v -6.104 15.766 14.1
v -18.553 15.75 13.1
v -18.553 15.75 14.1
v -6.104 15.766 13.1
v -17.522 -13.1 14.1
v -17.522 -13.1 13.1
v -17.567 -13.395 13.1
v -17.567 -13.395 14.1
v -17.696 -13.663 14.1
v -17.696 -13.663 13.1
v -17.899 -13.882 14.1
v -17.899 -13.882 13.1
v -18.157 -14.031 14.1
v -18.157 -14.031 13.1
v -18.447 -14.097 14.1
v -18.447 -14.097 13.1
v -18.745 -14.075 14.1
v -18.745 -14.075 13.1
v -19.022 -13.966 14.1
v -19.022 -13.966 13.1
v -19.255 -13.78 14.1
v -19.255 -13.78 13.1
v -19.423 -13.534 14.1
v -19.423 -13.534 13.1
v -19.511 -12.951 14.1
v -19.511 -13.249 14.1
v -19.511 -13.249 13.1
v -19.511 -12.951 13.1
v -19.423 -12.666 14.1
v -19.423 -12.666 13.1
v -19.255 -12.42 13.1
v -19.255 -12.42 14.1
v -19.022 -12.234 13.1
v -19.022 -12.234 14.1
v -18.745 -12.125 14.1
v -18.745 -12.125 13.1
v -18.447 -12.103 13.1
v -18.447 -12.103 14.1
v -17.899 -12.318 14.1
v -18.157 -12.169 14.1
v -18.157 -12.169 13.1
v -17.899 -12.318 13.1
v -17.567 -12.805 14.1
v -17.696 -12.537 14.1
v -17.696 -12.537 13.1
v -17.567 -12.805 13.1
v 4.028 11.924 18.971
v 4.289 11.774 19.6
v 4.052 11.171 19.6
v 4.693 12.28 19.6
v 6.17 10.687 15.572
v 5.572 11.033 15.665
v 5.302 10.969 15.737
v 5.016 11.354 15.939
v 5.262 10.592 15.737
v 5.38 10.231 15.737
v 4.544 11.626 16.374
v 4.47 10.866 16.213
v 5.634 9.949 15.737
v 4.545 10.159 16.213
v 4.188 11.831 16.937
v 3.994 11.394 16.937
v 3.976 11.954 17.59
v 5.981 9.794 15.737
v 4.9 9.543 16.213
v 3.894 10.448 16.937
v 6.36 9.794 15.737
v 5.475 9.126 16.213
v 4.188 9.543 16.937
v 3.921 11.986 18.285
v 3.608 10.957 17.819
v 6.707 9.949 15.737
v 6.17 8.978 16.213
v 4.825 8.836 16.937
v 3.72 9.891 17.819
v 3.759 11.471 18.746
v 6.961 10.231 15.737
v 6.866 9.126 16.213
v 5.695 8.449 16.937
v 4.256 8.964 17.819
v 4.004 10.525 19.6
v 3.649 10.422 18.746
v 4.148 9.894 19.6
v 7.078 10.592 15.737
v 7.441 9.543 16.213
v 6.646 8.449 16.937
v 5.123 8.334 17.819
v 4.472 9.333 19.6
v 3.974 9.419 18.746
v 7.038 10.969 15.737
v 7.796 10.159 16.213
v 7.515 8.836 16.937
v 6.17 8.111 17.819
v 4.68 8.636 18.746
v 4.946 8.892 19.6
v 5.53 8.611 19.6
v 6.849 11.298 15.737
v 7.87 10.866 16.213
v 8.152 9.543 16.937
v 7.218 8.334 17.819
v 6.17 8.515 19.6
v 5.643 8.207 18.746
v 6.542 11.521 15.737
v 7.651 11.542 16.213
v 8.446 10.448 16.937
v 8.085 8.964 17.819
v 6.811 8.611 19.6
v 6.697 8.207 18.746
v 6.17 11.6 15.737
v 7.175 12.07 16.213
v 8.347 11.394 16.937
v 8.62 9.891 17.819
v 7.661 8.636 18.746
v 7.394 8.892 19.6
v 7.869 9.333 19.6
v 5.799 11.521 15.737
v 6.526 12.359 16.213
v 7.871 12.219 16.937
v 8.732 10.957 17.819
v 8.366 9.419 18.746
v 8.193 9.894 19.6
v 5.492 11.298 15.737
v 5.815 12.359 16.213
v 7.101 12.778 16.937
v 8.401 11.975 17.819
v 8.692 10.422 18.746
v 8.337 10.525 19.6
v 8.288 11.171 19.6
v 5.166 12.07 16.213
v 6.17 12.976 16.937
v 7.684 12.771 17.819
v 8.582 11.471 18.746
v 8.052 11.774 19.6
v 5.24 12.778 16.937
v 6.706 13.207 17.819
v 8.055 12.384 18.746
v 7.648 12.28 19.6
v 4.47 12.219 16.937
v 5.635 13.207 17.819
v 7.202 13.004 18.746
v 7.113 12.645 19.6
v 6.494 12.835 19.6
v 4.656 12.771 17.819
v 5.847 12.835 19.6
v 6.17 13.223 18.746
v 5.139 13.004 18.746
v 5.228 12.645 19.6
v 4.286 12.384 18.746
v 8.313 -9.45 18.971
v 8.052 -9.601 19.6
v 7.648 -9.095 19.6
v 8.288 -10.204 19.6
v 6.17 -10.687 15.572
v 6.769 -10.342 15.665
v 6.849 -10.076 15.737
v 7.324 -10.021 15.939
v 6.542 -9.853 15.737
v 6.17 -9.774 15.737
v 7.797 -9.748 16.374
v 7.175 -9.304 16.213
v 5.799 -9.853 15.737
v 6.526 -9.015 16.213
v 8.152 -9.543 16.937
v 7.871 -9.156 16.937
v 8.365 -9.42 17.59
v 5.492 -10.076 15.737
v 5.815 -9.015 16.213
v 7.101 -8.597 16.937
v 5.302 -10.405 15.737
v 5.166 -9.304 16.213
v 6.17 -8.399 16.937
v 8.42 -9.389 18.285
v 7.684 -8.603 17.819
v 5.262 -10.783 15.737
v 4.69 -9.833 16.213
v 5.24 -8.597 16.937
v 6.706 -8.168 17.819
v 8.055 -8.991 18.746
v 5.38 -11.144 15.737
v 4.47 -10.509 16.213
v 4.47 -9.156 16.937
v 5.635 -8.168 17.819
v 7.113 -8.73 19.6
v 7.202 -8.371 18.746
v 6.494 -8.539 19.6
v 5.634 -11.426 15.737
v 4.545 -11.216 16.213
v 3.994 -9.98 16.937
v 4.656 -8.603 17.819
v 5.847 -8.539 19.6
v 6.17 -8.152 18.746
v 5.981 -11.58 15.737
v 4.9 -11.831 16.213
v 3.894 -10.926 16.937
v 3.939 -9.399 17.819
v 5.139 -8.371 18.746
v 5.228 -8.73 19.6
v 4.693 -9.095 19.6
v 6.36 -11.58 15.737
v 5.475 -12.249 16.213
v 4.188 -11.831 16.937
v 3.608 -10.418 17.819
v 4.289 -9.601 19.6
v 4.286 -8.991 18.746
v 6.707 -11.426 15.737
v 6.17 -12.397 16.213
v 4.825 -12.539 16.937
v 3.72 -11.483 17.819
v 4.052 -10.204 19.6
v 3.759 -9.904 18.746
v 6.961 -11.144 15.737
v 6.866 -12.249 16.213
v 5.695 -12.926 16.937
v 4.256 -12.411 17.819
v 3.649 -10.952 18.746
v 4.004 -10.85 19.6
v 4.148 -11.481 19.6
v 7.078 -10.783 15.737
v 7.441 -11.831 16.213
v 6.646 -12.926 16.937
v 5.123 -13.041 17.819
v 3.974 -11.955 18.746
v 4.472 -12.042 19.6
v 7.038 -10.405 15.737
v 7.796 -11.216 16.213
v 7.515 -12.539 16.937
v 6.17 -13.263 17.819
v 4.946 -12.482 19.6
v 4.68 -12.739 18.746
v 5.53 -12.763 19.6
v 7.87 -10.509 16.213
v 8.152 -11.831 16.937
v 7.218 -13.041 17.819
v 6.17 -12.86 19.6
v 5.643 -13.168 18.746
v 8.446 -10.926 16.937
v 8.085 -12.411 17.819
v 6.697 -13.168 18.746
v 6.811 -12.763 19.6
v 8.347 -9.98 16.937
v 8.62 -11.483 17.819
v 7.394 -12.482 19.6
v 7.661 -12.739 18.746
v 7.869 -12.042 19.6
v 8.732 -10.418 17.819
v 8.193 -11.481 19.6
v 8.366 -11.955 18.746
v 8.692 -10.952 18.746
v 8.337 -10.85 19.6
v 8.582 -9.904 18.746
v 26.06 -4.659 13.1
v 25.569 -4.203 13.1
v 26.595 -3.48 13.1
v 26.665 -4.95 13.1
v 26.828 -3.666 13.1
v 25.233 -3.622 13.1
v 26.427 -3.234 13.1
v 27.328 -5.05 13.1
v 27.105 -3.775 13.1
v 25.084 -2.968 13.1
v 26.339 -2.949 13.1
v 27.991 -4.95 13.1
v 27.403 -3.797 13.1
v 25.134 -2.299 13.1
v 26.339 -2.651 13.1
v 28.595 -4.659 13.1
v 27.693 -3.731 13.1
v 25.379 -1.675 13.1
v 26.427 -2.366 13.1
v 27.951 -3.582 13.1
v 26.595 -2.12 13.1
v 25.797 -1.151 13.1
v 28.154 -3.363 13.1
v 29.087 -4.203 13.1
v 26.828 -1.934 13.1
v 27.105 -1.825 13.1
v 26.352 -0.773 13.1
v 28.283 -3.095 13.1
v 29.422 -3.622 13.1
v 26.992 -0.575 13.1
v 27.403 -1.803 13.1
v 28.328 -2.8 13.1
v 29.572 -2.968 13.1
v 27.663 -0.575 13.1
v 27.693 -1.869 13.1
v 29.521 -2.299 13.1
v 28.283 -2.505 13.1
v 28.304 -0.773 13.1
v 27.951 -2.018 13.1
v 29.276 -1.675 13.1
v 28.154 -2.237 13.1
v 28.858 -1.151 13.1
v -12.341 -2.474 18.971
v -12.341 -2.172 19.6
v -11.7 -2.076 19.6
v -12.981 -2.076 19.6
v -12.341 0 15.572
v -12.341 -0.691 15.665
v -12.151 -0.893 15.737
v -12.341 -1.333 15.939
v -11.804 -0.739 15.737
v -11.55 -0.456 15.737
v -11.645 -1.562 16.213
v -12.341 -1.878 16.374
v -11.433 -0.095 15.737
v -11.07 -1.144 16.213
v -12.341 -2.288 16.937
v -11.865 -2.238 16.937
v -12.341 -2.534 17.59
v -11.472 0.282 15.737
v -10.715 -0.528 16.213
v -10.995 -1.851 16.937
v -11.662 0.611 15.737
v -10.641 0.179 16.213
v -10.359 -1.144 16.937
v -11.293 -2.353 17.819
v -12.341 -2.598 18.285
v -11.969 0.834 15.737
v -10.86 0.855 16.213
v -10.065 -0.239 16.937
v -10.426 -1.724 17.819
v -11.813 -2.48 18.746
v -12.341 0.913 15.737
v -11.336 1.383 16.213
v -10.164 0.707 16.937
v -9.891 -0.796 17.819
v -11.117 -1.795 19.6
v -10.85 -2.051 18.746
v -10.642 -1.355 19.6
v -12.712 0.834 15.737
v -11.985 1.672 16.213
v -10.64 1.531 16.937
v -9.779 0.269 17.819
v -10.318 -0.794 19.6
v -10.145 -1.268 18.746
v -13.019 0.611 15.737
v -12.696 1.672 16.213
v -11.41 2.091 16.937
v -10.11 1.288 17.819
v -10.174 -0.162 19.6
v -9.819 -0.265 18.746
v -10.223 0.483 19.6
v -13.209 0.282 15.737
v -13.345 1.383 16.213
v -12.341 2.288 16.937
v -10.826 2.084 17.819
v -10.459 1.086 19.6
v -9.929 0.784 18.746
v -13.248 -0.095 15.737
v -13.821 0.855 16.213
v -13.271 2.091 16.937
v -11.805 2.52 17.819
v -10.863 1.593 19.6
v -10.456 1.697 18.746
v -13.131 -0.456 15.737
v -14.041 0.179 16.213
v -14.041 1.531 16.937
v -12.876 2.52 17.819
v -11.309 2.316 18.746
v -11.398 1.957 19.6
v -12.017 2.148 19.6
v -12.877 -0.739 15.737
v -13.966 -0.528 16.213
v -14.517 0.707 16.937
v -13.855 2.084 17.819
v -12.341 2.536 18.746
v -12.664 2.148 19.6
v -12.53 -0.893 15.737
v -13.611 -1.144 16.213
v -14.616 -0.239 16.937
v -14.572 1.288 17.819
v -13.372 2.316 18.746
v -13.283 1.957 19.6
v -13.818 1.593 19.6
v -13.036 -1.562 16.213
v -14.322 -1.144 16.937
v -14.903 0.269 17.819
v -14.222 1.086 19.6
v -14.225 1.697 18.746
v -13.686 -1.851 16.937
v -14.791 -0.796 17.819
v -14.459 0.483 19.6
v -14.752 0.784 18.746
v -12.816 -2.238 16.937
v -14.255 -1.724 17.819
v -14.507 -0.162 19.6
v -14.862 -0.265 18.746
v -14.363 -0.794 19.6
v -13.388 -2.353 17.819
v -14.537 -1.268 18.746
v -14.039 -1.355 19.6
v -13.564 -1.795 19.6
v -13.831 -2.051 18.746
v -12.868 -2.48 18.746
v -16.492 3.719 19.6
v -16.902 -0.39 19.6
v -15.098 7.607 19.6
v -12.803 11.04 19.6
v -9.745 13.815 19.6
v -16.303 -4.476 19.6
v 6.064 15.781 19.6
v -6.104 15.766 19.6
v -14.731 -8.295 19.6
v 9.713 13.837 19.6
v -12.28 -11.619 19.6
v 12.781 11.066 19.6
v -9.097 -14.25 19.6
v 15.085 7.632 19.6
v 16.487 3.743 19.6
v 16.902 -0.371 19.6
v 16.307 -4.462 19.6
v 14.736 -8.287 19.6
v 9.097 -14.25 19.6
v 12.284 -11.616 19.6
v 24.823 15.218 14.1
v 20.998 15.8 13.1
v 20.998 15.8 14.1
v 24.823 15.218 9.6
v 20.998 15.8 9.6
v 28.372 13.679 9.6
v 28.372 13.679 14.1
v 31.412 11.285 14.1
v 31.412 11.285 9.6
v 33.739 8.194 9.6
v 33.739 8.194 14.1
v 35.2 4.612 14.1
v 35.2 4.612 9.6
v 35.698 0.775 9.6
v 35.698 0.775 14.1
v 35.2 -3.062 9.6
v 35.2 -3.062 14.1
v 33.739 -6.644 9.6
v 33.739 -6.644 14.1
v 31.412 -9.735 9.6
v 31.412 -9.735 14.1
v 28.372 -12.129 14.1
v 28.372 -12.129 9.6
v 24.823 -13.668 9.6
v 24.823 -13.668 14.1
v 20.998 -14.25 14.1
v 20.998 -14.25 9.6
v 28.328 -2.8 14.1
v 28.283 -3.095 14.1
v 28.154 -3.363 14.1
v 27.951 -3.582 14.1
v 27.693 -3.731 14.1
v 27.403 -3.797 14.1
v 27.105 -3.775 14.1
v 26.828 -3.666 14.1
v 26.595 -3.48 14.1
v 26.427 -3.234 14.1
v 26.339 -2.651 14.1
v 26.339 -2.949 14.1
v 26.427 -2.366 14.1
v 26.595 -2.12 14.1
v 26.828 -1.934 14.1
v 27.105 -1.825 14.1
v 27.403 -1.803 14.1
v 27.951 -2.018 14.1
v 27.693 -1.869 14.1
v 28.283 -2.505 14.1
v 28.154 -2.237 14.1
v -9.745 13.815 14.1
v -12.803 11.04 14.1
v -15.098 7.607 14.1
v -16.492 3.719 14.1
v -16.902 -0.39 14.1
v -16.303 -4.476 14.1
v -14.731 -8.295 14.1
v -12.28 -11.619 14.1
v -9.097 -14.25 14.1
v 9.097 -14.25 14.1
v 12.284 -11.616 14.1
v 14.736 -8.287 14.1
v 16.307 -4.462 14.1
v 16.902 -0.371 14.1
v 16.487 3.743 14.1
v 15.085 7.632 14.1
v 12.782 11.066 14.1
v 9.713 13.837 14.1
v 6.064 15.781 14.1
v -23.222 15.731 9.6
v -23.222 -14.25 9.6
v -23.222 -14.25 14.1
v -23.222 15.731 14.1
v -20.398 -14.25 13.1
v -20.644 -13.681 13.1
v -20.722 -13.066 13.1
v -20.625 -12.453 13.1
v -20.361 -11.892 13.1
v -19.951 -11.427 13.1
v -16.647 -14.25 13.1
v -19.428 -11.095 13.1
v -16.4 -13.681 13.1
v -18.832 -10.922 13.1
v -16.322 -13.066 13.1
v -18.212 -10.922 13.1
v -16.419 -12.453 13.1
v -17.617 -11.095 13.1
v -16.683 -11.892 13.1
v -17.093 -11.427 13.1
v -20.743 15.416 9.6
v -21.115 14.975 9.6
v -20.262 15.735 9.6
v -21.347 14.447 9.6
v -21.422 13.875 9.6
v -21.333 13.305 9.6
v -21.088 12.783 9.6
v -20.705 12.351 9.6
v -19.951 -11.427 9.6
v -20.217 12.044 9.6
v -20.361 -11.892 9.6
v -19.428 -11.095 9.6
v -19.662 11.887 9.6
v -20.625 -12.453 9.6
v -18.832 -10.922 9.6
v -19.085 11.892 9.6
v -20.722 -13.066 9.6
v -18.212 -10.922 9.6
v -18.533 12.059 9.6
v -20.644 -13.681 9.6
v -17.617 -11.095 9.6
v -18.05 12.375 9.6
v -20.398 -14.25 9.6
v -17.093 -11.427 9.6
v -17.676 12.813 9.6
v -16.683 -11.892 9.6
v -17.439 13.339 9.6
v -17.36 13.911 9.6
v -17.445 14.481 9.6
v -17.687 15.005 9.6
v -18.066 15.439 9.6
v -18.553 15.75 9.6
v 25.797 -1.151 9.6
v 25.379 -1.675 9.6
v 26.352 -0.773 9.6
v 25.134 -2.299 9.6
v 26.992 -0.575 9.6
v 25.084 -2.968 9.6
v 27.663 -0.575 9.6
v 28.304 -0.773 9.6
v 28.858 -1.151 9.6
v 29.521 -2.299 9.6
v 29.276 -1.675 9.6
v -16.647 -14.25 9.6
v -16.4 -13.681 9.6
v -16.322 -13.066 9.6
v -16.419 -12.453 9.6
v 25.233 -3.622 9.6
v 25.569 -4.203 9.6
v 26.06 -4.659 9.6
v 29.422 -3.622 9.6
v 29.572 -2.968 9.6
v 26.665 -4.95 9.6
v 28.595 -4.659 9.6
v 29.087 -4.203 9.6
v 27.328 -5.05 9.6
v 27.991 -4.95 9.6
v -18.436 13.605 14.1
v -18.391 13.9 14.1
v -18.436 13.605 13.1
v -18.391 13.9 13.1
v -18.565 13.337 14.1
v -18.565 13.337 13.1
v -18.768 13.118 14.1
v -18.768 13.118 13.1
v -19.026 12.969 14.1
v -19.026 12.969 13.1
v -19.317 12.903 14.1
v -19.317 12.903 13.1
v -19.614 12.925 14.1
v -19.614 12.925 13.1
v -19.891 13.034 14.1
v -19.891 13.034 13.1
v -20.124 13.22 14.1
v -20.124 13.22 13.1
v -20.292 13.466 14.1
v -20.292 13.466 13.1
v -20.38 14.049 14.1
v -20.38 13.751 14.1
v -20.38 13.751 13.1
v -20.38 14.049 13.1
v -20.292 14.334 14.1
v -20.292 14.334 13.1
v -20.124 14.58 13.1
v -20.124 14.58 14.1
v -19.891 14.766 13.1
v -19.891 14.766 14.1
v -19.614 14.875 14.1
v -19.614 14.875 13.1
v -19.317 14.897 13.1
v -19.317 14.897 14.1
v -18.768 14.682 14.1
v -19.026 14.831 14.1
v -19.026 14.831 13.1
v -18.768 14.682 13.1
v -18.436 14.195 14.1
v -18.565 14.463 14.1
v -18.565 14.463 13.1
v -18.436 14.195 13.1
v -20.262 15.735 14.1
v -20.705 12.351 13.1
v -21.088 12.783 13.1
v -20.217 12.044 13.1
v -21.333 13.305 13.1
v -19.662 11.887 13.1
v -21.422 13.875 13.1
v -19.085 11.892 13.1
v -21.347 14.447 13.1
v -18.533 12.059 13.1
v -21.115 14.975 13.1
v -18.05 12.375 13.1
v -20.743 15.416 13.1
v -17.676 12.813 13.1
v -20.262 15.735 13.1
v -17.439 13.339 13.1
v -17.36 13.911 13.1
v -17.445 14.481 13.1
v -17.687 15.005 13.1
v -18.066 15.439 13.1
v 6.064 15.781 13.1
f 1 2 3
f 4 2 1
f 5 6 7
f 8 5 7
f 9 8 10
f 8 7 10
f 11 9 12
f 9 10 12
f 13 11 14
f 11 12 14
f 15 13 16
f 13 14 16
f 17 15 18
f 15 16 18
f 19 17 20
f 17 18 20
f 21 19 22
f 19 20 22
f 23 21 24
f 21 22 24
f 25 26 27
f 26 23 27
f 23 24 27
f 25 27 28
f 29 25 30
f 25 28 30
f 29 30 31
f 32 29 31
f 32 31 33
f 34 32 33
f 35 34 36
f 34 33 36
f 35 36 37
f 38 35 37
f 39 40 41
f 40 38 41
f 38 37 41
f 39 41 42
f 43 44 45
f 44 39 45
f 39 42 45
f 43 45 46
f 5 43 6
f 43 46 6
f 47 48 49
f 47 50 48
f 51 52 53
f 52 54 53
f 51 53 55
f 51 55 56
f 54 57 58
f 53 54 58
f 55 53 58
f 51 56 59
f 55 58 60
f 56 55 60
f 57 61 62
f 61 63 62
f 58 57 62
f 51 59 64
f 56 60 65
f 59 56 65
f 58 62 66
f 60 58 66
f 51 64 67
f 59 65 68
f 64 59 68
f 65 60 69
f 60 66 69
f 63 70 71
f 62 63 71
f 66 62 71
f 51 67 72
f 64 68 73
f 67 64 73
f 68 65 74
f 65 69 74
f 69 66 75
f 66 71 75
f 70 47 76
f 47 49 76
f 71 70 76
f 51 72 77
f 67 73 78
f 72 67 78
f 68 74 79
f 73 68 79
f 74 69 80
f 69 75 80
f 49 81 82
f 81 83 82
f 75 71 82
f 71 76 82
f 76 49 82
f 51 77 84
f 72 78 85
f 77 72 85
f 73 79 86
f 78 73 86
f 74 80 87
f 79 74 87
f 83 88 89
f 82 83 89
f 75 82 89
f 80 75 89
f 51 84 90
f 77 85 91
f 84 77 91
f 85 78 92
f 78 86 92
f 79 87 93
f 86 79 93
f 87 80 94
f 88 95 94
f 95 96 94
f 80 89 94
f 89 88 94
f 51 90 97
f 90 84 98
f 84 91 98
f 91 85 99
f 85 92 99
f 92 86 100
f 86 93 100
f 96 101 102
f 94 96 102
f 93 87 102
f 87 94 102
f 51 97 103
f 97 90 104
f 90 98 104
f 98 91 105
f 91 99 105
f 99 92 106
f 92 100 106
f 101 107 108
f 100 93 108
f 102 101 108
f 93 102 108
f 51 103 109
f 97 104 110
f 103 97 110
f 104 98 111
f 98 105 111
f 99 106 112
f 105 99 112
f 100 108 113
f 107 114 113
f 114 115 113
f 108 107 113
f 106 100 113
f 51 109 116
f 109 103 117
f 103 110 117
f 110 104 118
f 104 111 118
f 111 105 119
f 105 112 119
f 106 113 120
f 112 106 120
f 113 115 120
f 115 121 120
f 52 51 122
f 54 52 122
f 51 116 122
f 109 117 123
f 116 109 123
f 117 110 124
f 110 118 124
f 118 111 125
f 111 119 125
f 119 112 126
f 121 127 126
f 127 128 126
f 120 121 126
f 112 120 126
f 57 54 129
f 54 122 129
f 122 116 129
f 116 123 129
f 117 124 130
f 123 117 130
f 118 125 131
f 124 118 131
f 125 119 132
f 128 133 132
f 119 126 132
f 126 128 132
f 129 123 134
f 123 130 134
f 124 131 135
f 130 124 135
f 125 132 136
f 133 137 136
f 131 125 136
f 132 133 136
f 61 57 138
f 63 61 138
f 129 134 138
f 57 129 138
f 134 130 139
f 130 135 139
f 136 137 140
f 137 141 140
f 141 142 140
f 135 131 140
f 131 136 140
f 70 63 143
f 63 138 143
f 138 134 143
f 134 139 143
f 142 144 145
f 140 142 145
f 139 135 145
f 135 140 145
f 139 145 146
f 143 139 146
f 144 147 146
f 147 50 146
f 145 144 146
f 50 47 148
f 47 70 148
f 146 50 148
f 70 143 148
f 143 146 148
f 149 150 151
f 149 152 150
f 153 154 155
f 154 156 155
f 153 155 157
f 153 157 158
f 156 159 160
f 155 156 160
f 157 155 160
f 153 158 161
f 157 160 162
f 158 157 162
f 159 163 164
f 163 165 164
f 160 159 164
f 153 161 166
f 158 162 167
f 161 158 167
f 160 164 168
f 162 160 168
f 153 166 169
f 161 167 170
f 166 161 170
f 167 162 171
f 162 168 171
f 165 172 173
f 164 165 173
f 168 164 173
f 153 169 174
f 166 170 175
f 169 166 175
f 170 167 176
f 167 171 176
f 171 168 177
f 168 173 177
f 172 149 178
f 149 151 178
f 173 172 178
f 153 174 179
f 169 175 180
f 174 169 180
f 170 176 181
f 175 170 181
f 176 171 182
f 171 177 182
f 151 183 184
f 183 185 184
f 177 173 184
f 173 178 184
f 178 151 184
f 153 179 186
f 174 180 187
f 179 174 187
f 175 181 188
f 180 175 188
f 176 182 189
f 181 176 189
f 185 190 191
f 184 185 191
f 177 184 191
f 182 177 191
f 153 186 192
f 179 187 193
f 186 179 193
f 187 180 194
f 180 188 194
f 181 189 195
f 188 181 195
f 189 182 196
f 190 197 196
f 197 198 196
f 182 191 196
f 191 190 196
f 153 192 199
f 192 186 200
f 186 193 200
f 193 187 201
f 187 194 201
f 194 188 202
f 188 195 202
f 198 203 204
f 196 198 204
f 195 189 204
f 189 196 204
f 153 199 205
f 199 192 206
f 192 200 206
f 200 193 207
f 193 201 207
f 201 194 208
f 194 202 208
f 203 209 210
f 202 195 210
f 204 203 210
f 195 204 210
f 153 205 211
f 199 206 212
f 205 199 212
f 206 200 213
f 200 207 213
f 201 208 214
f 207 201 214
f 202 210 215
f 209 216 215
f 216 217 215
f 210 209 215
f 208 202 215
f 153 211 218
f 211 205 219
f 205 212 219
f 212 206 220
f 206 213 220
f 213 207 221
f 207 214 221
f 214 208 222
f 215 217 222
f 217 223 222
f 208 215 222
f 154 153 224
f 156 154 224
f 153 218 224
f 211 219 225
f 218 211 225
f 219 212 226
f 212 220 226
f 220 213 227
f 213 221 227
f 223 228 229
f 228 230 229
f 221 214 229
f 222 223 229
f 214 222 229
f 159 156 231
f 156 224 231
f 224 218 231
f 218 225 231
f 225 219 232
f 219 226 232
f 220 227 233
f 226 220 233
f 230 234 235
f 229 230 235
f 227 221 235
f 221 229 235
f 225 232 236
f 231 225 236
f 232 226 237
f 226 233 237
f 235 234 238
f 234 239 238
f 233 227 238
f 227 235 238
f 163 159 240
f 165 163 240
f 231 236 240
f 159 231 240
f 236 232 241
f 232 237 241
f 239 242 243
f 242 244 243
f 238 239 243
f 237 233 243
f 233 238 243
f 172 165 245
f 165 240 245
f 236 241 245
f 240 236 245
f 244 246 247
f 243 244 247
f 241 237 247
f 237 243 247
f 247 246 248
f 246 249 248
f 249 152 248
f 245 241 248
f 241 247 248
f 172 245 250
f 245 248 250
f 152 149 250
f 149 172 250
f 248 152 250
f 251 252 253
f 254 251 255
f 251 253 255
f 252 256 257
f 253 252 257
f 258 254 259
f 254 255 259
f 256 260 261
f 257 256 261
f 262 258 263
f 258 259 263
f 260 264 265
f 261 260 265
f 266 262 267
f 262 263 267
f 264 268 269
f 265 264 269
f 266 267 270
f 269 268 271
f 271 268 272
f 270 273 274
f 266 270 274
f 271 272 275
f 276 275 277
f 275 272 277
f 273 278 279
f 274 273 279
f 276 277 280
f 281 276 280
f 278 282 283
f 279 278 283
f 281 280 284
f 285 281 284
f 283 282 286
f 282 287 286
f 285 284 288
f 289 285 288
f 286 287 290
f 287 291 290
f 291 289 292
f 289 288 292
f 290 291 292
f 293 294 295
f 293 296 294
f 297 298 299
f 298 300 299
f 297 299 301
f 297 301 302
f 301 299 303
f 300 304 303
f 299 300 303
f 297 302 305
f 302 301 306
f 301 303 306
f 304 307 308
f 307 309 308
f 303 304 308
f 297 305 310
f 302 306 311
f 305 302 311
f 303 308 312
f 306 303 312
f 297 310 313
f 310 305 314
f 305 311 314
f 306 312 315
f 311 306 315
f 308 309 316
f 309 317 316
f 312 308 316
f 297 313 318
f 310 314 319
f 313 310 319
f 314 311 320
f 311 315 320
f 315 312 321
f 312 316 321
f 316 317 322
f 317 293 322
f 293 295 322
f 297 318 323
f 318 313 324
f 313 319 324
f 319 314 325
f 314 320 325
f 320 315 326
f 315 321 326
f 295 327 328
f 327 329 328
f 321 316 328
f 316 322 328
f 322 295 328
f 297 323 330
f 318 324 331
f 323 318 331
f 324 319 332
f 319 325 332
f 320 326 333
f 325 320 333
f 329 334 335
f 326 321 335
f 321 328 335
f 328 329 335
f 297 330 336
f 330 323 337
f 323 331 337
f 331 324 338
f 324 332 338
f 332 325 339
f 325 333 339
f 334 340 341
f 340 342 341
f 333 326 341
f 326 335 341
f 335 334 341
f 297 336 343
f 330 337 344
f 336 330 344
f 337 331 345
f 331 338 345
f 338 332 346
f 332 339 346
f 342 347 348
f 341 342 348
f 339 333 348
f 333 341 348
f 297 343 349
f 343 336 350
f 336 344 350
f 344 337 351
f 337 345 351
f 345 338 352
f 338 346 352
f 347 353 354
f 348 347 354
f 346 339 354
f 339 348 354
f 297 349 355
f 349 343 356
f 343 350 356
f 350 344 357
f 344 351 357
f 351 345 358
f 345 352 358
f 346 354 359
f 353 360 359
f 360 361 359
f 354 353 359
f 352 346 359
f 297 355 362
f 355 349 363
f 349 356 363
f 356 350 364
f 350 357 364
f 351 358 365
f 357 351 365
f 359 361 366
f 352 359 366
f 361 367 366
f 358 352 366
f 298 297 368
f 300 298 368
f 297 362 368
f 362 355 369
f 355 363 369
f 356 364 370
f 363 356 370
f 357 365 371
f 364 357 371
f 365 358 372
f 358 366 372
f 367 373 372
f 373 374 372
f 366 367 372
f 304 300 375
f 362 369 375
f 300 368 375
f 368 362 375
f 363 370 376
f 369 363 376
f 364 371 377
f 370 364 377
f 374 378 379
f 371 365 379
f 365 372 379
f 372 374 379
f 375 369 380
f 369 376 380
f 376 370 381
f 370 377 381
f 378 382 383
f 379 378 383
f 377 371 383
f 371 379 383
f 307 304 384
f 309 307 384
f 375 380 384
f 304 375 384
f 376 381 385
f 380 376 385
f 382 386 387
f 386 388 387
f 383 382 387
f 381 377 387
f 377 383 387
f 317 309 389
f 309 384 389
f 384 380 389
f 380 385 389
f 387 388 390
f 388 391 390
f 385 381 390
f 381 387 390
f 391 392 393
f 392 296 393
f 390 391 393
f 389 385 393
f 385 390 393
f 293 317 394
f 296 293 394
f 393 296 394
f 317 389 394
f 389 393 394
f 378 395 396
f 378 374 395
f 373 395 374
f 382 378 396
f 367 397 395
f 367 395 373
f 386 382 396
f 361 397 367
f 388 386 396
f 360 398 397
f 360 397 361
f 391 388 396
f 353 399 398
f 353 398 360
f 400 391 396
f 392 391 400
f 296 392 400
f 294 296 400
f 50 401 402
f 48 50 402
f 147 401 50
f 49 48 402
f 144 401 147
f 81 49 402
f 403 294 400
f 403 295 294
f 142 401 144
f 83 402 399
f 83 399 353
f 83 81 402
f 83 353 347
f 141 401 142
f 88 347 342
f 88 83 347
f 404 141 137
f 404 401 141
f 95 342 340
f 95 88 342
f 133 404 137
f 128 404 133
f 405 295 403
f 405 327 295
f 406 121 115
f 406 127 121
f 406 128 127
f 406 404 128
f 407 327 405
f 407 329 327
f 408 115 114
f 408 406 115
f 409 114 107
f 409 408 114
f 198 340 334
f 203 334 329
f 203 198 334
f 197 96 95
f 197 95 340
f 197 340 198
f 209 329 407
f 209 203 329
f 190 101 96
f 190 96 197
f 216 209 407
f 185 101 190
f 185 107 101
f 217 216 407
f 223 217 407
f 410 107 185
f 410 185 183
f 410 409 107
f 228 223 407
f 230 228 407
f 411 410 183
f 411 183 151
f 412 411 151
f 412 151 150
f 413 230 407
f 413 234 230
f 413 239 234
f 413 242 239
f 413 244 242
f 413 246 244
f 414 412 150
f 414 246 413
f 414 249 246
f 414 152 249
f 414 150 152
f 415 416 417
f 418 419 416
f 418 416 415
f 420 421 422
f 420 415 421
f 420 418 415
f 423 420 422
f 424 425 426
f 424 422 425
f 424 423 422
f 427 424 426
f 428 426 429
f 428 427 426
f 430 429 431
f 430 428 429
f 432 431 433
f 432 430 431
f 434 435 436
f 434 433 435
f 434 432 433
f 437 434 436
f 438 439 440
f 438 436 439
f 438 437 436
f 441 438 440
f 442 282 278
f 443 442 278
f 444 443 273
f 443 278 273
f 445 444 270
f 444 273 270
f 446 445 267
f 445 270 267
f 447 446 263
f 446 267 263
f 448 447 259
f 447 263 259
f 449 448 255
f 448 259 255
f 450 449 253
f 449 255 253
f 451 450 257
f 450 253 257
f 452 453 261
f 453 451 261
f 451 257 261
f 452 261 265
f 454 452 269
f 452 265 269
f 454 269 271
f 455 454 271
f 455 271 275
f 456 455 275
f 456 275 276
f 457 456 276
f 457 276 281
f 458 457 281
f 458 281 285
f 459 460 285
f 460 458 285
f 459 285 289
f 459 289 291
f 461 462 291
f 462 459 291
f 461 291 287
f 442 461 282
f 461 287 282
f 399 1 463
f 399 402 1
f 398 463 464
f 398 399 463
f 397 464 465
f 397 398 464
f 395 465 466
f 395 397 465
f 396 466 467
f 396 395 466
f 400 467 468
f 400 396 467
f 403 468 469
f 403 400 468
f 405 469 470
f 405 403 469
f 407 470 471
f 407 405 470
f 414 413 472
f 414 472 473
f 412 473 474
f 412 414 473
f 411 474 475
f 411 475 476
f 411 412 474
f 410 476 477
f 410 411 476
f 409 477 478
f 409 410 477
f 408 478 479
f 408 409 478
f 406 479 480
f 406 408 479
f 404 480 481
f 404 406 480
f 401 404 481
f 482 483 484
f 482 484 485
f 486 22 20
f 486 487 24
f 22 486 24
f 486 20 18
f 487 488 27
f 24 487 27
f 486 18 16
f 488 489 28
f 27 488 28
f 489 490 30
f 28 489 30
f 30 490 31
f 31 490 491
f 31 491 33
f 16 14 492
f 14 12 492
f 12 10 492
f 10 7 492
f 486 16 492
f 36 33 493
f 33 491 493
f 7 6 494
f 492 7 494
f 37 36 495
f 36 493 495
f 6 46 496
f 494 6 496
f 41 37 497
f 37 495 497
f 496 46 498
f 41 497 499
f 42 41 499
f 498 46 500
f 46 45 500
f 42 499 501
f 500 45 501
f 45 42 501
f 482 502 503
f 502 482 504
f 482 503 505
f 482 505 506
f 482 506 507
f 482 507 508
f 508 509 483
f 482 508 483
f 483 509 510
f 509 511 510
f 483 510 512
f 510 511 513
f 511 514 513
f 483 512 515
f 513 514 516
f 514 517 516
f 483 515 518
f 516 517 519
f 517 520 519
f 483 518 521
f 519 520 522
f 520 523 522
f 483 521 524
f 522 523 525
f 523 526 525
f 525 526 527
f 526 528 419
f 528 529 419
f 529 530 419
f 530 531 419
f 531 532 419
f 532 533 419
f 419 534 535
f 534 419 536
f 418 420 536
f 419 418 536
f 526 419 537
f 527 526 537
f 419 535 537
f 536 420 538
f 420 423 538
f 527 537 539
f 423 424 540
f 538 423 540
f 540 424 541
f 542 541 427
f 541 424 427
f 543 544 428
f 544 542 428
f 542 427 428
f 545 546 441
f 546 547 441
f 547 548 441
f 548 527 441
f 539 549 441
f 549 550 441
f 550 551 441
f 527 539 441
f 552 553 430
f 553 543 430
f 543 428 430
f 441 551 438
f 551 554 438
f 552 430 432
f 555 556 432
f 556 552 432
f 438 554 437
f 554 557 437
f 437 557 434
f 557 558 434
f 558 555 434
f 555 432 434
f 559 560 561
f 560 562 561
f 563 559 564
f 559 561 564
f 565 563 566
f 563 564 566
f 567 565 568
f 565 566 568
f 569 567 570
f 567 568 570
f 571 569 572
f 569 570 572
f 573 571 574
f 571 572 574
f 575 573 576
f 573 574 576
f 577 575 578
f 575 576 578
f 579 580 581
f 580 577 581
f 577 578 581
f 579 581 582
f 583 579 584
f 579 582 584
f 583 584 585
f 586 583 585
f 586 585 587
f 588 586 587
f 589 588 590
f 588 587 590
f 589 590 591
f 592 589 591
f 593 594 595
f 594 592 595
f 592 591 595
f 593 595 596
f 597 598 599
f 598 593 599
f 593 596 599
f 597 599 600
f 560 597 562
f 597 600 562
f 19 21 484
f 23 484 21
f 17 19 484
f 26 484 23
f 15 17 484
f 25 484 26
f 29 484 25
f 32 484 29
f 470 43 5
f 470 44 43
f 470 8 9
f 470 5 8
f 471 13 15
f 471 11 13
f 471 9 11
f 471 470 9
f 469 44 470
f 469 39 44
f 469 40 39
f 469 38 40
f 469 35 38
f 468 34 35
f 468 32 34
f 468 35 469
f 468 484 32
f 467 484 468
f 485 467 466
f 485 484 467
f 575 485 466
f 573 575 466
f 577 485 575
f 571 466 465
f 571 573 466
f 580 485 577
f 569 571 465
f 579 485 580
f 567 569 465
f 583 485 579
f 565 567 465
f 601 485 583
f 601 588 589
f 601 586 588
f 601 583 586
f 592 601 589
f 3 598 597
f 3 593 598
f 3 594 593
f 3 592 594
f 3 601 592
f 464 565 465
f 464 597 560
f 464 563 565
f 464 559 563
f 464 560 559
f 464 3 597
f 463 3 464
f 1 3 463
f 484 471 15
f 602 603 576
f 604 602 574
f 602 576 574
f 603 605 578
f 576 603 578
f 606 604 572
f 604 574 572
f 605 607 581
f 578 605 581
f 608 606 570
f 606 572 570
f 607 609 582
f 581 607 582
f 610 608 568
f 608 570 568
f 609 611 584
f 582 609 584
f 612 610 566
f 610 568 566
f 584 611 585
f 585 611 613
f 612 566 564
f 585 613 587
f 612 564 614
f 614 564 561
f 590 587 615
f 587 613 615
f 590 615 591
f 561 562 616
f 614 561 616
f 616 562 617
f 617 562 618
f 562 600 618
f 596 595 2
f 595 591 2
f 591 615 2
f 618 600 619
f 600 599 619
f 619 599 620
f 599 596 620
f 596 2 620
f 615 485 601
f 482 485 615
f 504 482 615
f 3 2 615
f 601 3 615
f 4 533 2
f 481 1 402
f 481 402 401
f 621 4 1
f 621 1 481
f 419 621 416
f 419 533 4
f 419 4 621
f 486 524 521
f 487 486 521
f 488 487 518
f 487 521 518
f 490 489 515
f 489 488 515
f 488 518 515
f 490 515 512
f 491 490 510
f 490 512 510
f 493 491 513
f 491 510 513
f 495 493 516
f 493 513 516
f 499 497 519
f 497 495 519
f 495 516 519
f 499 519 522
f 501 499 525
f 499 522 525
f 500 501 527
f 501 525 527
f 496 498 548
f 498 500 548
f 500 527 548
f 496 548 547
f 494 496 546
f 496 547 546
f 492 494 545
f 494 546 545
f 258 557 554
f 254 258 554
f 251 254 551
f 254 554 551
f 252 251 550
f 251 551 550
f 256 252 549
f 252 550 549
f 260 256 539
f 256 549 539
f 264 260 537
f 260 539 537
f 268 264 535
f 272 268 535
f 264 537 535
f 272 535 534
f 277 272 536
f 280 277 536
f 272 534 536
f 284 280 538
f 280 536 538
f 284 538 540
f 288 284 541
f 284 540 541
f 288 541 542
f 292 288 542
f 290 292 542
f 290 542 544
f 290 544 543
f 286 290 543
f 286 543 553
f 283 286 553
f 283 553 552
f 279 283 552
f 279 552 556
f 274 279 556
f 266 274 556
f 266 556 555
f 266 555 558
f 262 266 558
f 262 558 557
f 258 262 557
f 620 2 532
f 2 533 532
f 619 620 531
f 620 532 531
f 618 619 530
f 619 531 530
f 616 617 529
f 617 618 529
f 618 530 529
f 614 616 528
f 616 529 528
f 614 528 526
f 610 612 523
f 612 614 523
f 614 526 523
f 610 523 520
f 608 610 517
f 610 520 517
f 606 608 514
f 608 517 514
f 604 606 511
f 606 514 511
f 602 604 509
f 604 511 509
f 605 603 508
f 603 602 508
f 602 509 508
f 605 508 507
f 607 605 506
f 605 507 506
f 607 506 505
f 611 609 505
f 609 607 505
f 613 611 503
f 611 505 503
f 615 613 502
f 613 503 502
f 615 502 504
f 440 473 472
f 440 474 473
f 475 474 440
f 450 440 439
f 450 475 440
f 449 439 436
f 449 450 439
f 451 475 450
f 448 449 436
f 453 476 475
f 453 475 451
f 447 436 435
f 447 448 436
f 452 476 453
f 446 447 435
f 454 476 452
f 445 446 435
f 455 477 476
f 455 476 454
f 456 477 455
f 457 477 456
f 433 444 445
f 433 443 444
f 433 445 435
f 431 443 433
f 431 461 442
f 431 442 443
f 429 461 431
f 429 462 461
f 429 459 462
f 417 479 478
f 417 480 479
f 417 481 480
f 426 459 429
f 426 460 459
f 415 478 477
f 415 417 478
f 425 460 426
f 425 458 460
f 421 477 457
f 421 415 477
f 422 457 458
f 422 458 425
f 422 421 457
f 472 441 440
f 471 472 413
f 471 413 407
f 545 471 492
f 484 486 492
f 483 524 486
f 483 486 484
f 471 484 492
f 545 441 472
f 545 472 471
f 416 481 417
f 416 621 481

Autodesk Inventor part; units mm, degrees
ref_plane "YZ Plane" through (0, 0, 0) normal (1, 0, 0) x (0, 1, 0)
ref_plane "Work Plane1" through (-1.2111, 0.775, 9.6) normal (0, 0, 1) x (0, -1, 0)
sketch "Sketch1" plane through (-1.2111, 0.775, 9.6) normal (0, 0, 1) x (0, -1, 0)
  circle A0 centre (3.575, 28.5389) radius 1.75 construction
  circle A1 centre (-13.125, -18.1803) radius 2 construction
  arc A2 (15.225, -15.8355) -> (15.225, -18.7868) centre (13.875, -17.3111) ccw construction
  line L0 (15.225, -15.8355) -> (15.225, 22.2111) construction
  arc A3 (15.225, 22.2111) -> (-15.225, 22.2111) centre (0, 21.8802) ccw construction
  line L1 (-15.225, 22.2111) -> (-15.225, -22.2111) construction
  line L2 (-15.225, -22.2111) -> (15.225, -22.2111) construction
  line L3 (15.225, -22.2111) -> (15.225, -18.7868) construction
  arc A4 (15.025, 22.209) -> (-15.025, 22.209) centre (0, 21.8802) ccw
  line L4 (15.025, 22.209) -> (15.025, -15.4356)
  arc A5 (15.025, -15.4356) -> (15.025, -19.1866) centre (13.875, -17.3111) ccw
  line L5 (15.025, -19.1866) -> (15.025, -22.0111)
  line L6 (15.025, -22.0111) -> (-14.956, -22.0111)
  arc A6 (-15.025, -18.8048) -> (-15.025, -17.5558) centre (-13.125, -18.1803) ccw construction
  circle A7 centre (3.575, 28.5389) radius 2.25
  arc A8 (-14.9598, -19.0514) -> (-14.9748, -17.3415) centre (-13.125, -18.1803) ccw
  line L7 (-14.956, -22.0111) -> (-14.9598, -19.0514)
  line L8 (-14.9748, -17.3415) -> (-15.025, 22.209)
  point P0 (0.775, 1.2111)
  dimension "d0" = 0.2
  dimension "d1" = 0.5
ref_plane "Work Plane2" through (21, -90, 18.7376) normal (0, 0, 1) x (1, 0, 0)
extrude "Extrusion1" add sketch "Sketch1" along normal blind 10
sketch "Sketch2" plane through (-16.6468, -14.25, 19.6) normal (0, 0, 1) x (1, 0, 0)
  circle A0 centre (16.6468, 14.25) radius 12.3406
  line L0 (4.3062, 14.25) -> (22.8171, 24.9373)
  line L1 (22.8171, 24.9373) -> (22.8171, 3.5627)
  line L2 (22.8171, 3.5627) -> (4.3062, 14.25)
ref_plane "Work Plane3" through (-12.3406, 0, 19.6) normal (-1, 0, 0) x (0, 0, 1)
sketch "Sketch3" plane through (-12.3406, 0, 19.6) normal (-1, 0, 0) x (0, 0, 1)
  line L0 (-0.8319, 0) -> (-10, 0)
  line L1 (-10, 15.8) -> (-10, -14.25) projected
  circle A0 centre (-1.4284, 0) radius 2.6
  line L2 (1.1716, 0) -> (-4.0284, 0)
  point P0 (-19.6, 0)
  dimension "d4" = 5.2
revolve "Revolution1" cut sketch "Sketch3" angle 360 about axis through (-12.3406, 0, 18.7681) along (0, 0, -1) picked at (-2.9377, -0.2074) contours L2 A0 L0
pattern_circular "Circular Pattern1" count 3 over 360 about axis through (0, 0, 19.6) along (0, 0, 1) of "Revolution1"
ref_plane "Work Plane4" through (25.5777, -4.55, 13.1) normal (0, 0, 1) x (1, 0, 0)
sketch "Sketch5" plane through (-1.2111, 0.775, 19.6) normal (0, 0, 1) x (1, 0, 0)
  circle A0 centre (1.2111, -0.775) radius 16.9061
  circle A1 centre (7.3815, 9.9123) radius 2.1725 projected
  circle A2 centre (7.3815, -11.4623) radius 2.1725 projected
  circle A3 centre (-11.1295, -0.775) radius 2.1725 projected
  circle A4 centre (28.5389, -3.575) radius 2.25 projected
  arc A5 (22.209, -15.025) -> (22.209, 15.025) centre (21.8802, 0) ccw projected
  line L0 (22.209, 15.025) -> (-17.3415, 14.9748) projected
  arc A6 (-19.0514, 14.9598) -> (-17.3415, 14.9748) centre (-18.1803, 13.125) ccw projected
  line L1 (-19.0514, 14.9598) -> (-22.0111, 14.956) projected
  line L2 (-22.0111, 14.956) -> (-22.0111, -15.025) projected
  line L3 (-22.0111, -15.025) -> (-19.1866, -15.025) projected
  arc A7 (-15.4356, -15.025) -> (-19.1866, -15.025) centre (-17.3111, -13.875) ccw projected
  line L4 (-15.4356, -15.025) -> (22.209, -15.025) projected
  line L5 (22.209, 15.025) -> (-17.3415, 14.9748) projected
  line L6 (-15.4356, -15.025) -> (22.209, -15.025) projected
  point P0 (7.2754, 15.006)
  point P1 (-4.8932, 14.9906)
  point P2 (-7.8858, -15.025)
  point P3 (10.3081, -15.025)
extrude "Extrusion3" cut sketch "Sketch5" against normal up to surface (6.5 mm away) contours A0 L0 A5 L4 | A0 L4 A7 L3 L2 L1 A6 L0
sketch "Sketch6" plane through (-1.2111, 0.775, 13.1) normal (0, 0, 1) x (1, 0, 0)
  circle A0 centre (28.5389, -3.575) radius 2.25 projected
  arc A1 (22.209, -15.025) -> (22.209, 15.025) centre (21.8802, 0) ccw projected
  line L0 (7.2754, 15.006) -> (22.209, 15.025) projected
  arc A2 (10.3081, -15.025) -> (7.2754, 15.006) centre (1.2111, -0.775) ccw projected
  line L1 (22.209, -15.025) -> (10.3081, -15.025) projected
  arc A3 (-19.0514, 14.9598) -> (-17.3415, 14.9748) centre (-18.1803, 13.125) ccw projected
  line L2 (-22.0111, 14.956) -> (-19.0514, 14.9598) projected
  line L3 (-22.0111, -15.025) -> (-22.0111, 14.956) projected
  line L4 (-19.1866, -15.025) -> (-22.0111, -15.025) projected
  arc A4 (-15.4356, -15.025) -> (-19.1866, -15.025) centre (-17.3111, -13.875) ccw projected
  line L5 (-7.8858, -15.025) -> (-15.4356, -15.025) projected
  arc A5 (-4.8932, 14.9906) -> (-7.8858, -15.025) centre (1.2111, -0.775) ccw projected
  line L6 (-17.3415, 14.9748) -> (-4.8932, 14.9906) projected
  circle A6 centre (-18.1803, 13.125) radius 1
  circle A7 centre (-17.3111, -13.875) radius 1
  circle A8 centre (28.5389, -3.575) radius 1
  arc A9 (-19.0514, 14.9598) -> (-17.3415, 14.9748) centre (-18.1803, 13.125) ccw projected
  line L7 (-17.3415, 14.9748) -> (-19.0514, 14.9598)
  line L8 (-15.4356, -15.025) -> (-19.1866, -15.025)
  point P0 (1.2111, -0.775)
  dimension "d13" = 2
  dimension "d14" = 2
  dimension "d15" = 2
extrude "Extrusion4" add sketch "Sketch6" along normal blind 1 contours A0 | L1 A2 L0 A1 | L7 A3 | A3 L6 A5 L5 A4 L4 L3 L2 | A4 L8
properties part number "03_Insert_Chip_solid"
